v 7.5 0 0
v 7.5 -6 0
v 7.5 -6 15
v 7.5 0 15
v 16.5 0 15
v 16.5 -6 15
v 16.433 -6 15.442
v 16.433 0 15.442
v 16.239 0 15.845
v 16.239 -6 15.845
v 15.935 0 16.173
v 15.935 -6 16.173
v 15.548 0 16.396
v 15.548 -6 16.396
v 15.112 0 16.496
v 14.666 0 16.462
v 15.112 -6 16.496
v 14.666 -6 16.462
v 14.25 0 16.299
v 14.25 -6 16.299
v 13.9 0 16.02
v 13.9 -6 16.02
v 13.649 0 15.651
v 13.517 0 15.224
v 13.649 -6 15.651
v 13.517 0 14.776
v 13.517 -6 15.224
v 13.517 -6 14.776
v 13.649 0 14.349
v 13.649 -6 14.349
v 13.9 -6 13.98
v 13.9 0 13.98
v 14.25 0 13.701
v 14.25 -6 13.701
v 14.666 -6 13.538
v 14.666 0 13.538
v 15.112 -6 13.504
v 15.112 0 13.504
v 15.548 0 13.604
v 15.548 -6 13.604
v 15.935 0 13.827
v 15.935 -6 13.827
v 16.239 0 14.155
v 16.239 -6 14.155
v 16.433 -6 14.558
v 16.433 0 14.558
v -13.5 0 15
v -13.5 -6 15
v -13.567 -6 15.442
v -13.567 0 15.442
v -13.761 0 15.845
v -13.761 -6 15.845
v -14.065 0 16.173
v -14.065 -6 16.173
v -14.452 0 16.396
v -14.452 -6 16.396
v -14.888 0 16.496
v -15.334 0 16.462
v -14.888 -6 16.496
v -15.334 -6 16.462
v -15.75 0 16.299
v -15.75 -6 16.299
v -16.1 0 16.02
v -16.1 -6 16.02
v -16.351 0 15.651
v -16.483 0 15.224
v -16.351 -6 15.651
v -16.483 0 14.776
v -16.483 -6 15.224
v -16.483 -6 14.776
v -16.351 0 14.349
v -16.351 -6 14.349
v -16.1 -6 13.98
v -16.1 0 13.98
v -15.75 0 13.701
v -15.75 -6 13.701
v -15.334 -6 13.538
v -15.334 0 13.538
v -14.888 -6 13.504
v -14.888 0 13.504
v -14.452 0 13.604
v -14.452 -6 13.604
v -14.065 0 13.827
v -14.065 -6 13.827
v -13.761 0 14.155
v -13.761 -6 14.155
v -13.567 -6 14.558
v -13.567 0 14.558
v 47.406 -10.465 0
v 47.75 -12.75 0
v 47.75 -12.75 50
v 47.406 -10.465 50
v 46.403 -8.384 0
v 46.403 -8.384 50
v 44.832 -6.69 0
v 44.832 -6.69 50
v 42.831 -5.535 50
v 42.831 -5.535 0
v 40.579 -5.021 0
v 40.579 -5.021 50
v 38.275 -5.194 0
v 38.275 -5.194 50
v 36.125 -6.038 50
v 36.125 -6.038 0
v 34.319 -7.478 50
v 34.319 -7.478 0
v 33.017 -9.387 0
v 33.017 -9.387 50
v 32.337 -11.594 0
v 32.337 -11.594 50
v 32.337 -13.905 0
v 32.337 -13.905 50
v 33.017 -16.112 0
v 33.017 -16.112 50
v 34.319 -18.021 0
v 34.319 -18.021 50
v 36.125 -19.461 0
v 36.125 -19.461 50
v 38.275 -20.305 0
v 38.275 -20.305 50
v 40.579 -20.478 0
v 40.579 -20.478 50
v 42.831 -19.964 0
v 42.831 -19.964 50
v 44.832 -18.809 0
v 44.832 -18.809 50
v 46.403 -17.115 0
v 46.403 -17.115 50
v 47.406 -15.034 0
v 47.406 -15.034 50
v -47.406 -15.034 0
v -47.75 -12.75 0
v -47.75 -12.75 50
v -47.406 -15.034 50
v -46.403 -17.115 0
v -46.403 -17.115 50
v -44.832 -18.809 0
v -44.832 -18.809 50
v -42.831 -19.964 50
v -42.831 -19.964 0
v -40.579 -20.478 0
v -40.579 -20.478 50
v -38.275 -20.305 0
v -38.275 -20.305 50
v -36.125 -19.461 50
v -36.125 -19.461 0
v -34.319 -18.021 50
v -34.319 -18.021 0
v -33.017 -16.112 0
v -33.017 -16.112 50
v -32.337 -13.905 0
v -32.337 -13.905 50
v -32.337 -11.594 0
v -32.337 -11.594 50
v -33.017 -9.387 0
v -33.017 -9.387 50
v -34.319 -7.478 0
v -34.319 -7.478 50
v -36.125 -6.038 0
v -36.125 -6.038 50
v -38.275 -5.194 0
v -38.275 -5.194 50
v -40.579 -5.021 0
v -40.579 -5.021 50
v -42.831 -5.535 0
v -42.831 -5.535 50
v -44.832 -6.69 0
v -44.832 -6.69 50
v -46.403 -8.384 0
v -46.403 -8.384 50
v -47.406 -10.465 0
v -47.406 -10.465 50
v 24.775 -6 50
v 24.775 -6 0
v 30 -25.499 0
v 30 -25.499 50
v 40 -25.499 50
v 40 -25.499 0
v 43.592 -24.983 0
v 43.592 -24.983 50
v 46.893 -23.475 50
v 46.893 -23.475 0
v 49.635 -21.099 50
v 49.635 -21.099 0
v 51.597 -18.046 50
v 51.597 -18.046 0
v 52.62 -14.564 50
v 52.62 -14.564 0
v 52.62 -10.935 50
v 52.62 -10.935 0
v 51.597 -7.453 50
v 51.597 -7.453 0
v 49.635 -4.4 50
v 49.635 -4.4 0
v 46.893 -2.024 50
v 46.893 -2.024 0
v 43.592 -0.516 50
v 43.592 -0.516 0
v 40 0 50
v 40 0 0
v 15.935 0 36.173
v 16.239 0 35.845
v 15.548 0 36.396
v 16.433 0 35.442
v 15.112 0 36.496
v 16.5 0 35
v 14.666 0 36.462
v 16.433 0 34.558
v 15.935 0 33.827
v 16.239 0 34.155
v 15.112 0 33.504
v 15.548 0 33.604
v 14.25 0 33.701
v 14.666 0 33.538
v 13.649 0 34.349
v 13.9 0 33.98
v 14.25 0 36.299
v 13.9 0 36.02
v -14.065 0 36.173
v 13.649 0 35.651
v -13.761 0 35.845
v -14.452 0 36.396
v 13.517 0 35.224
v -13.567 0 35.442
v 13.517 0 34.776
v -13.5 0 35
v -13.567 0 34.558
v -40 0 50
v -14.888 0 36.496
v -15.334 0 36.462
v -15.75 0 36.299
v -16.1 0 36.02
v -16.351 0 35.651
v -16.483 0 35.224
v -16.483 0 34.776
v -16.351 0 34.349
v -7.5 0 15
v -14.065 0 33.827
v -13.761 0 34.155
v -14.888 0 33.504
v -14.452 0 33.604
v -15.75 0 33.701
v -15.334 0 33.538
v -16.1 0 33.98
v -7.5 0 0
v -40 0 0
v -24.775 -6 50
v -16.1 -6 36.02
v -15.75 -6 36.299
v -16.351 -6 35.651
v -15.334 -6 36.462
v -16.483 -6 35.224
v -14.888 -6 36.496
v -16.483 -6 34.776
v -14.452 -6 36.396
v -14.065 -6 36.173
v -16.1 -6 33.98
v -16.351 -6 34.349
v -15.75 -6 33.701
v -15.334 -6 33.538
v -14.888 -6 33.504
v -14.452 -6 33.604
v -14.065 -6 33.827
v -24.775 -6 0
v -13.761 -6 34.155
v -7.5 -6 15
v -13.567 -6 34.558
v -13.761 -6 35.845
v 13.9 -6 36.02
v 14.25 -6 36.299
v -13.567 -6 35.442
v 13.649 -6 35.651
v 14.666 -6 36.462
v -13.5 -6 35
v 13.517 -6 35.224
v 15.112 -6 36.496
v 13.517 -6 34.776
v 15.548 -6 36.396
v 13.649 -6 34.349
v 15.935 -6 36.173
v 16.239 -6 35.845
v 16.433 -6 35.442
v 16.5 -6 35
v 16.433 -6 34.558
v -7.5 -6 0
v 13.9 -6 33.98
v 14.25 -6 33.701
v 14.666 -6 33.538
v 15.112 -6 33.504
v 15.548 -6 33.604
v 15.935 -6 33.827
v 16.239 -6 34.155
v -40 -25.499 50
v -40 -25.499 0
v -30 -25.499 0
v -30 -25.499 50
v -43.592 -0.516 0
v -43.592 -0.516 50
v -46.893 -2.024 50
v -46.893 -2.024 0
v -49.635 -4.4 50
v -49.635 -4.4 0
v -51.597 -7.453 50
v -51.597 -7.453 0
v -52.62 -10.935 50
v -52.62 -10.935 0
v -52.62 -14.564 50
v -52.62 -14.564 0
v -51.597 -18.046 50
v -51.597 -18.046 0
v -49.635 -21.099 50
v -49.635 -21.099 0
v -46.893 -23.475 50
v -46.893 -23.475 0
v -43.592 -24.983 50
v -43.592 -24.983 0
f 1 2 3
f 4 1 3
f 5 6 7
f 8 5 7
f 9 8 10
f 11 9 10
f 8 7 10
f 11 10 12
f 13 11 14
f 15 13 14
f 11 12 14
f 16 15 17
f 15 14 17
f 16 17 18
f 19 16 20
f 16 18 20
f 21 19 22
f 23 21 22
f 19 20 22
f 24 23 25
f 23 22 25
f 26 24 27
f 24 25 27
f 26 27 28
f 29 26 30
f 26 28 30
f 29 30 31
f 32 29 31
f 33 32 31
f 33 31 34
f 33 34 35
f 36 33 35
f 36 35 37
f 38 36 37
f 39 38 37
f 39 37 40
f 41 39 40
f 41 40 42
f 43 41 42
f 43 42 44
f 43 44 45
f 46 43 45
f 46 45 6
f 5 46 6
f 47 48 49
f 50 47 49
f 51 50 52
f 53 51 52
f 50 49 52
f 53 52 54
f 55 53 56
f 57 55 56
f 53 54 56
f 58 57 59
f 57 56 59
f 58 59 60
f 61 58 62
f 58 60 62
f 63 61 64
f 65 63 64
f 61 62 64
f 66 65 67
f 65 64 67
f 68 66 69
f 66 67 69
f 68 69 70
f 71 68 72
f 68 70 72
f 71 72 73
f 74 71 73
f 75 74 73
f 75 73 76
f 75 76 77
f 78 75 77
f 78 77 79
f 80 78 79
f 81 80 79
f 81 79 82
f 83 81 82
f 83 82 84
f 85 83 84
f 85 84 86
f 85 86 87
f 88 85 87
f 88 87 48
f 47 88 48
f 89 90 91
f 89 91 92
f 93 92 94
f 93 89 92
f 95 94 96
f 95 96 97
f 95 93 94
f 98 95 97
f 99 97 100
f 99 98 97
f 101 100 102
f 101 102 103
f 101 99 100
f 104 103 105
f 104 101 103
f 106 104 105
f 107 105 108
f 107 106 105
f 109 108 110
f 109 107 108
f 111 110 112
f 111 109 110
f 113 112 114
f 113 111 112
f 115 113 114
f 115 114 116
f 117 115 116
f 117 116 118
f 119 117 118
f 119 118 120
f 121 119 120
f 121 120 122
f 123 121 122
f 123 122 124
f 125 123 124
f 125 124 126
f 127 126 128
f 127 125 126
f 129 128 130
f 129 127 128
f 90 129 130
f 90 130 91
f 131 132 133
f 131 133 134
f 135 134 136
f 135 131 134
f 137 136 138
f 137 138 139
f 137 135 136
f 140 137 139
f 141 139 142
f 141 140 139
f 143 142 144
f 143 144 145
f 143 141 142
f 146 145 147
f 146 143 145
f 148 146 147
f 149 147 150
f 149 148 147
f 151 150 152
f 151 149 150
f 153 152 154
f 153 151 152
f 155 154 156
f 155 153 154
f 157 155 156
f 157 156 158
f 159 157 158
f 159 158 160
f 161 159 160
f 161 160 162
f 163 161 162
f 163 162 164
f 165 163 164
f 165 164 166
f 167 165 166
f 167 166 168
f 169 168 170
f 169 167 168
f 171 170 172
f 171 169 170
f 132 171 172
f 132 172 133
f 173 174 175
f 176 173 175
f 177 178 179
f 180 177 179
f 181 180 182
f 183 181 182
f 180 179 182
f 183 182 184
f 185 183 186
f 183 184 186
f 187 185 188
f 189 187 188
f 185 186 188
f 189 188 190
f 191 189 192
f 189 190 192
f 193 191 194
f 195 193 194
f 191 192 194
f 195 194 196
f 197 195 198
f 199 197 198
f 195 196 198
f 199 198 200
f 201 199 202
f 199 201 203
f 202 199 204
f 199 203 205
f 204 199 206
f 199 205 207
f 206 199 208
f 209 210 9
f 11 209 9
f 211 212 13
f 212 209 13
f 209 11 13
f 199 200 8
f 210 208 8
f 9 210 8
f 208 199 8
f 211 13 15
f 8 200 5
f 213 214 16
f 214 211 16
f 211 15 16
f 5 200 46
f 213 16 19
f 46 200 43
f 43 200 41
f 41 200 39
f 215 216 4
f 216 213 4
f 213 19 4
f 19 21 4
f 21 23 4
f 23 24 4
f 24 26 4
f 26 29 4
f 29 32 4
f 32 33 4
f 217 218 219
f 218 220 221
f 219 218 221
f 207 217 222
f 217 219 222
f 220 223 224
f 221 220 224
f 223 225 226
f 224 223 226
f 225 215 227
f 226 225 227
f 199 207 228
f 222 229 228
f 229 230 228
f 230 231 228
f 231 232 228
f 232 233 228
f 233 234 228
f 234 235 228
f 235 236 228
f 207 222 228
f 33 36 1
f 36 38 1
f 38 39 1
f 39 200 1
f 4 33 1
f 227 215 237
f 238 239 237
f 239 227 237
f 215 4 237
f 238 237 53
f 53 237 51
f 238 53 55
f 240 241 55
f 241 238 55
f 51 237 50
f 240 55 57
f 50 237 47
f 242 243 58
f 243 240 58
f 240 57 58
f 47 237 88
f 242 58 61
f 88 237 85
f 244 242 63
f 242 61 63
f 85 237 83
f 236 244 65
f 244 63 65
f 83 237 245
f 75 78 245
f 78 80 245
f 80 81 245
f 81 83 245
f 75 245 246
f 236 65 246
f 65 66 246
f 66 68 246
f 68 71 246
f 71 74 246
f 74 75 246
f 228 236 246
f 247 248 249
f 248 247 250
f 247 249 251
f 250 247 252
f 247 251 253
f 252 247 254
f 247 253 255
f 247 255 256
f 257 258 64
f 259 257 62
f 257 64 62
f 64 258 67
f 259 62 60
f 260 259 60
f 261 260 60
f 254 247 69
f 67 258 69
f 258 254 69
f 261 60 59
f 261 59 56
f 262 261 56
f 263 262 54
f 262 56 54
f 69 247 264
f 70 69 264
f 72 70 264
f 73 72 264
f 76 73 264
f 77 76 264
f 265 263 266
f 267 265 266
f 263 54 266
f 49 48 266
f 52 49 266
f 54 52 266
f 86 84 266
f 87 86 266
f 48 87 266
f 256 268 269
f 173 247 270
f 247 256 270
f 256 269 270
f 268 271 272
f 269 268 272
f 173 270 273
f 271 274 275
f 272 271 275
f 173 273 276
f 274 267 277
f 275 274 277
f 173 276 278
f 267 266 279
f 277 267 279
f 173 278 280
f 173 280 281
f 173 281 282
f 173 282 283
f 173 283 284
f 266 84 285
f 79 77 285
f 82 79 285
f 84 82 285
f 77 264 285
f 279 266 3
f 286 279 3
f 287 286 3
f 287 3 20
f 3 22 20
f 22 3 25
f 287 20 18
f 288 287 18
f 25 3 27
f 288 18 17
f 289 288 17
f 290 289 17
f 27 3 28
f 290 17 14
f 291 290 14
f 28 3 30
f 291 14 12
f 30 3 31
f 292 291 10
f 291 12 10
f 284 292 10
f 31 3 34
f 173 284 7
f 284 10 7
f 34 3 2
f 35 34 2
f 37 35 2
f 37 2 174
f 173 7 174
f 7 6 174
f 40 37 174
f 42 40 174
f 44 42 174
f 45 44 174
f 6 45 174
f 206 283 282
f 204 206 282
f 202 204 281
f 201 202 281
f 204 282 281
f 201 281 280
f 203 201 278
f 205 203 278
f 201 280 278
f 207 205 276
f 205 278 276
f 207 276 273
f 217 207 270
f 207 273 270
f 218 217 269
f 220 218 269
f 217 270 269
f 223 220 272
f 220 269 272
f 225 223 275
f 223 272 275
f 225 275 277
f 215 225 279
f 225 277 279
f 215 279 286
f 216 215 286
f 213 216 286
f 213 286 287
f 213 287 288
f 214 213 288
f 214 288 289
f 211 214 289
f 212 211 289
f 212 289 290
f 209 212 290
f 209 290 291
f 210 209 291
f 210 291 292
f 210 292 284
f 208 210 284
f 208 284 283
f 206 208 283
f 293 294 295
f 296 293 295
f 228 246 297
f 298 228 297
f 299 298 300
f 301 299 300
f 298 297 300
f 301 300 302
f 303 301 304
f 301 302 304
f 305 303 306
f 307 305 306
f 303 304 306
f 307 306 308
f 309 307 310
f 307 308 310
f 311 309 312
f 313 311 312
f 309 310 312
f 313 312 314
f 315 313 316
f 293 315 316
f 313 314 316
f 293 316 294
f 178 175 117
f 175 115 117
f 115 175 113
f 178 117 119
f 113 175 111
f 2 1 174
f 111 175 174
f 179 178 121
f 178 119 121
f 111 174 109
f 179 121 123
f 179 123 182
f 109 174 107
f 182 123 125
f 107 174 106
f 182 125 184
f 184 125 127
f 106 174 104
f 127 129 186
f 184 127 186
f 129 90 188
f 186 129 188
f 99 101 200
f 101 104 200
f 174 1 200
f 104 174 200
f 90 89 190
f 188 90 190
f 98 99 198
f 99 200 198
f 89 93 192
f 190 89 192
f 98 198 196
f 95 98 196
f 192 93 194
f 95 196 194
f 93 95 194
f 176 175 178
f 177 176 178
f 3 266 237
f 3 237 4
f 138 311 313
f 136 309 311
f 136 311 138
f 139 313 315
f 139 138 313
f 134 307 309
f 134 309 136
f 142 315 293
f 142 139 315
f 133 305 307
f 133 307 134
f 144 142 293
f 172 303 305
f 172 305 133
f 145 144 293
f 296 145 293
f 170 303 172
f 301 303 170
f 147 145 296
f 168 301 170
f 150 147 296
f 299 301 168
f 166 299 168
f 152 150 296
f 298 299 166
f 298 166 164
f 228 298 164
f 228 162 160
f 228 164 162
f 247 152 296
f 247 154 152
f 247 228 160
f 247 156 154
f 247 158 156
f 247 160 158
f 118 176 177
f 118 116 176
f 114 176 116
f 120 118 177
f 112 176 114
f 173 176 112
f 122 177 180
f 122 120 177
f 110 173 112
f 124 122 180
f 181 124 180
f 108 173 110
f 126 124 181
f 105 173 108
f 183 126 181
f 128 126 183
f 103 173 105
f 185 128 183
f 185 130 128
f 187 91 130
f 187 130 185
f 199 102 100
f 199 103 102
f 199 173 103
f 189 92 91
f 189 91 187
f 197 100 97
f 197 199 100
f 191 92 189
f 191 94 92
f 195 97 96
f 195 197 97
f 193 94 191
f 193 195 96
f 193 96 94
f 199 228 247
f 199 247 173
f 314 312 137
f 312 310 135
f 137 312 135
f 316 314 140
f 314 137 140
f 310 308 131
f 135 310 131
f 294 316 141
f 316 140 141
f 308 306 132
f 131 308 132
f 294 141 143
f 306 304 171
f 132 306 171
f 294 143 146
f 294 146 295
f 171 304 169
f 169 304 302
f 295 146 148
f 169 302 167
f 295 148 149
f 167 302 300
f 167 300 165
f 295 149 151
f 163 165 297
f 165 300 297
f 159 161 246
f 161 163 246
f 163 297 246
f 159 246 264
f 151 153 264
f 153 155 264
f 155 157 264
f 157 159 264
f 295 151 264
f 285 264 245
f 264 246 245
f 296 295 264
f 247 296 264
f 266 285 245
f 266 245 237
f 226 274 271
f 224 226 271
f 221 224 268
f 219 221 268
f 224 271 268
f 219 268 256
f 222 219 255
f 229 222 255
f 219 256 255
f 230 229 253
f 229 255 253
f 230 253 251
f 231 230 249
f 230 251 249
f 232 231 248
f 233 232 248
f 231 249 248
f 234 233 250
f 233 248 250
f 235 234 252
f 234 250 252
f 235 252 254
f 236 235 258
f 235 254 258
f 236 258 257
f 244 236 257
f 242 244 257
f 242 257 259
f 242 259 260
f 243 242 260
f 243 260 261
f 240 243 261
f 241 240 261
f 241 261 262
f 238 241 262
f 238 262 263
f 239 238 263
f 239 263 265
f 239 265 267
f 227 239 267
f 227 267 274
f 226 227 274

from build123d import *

# Parameters (mm, degrees)
ESBO_O1_R                = 7.75
RESSALTO_EXTRUS_O1_DEPTH = 50
ESBO_O2_R                = 1.5
ESBO_O2_W                = 15
ESBO_O2_H                = 15
CORTE_EXTRUS_O1_DEPTH    = 30


with BuildPart() as part:
    # Esboço1 → Ressalto-extrusão1 (new body)
    with BuildSketch(Plane.XY):
        with BuildLine():
            Line((40, 0), (-40, 0))
            ThreePointArc((-40, 0), (-52.749521473, -12.749521473), (-40, -25.499042945))
            Line((-40, -25.499042945), (-30, -25.499042945))
            Line((-30, -25.499042945), (-24.77524719, -6))
            Line((-24.77524719, -6), (24.77524719, -6))
            Line((24.77524719, -6), (30, -25.499042945))
            Line((30, -25.499042945), (40, -25.499042945))
            ThreePointArc((40, -25.499042945), (52.749521473, -12.749521473), (40, 0))
        make_face()
        with Locations(Location((-40, -12.749521473, 0), (0, 0, 180))):
            Circle(ESBO_O1_R, mode=Mode.SUBTRACT)
        with Locations((40, -12.749521473)):
            Circle(ESBO_O1_R, mode=Mode.SUBTRACT)
    extrude(amount=RESSALTO_EXTRUS_O1_DEPTH)

    # Esboço2 → Corte-extrusão1 (cut)
    with BuildSketch(Plane.XZ.offset(25.499042945)):
        with Locations((15, 35)):
            Circle(ESBO_O2_R)
        with Locations((15, 15)):
            Circle(ESBO_O2_R)
        with Locations((-15, 15)):
            Circle(ESBO_O2_R)
        with Locations((-15, 35)):
            Circle(ESBO_O2_R)
        with Locations((0, 7.5)):
            Rectangle(ESBO_O2_W, ESBO_O2_H)
    extrude(amount=-CORTE_EXTRUS_O1_DEPTH, mode=Mode.SUBTRACT)


solid = part.part
